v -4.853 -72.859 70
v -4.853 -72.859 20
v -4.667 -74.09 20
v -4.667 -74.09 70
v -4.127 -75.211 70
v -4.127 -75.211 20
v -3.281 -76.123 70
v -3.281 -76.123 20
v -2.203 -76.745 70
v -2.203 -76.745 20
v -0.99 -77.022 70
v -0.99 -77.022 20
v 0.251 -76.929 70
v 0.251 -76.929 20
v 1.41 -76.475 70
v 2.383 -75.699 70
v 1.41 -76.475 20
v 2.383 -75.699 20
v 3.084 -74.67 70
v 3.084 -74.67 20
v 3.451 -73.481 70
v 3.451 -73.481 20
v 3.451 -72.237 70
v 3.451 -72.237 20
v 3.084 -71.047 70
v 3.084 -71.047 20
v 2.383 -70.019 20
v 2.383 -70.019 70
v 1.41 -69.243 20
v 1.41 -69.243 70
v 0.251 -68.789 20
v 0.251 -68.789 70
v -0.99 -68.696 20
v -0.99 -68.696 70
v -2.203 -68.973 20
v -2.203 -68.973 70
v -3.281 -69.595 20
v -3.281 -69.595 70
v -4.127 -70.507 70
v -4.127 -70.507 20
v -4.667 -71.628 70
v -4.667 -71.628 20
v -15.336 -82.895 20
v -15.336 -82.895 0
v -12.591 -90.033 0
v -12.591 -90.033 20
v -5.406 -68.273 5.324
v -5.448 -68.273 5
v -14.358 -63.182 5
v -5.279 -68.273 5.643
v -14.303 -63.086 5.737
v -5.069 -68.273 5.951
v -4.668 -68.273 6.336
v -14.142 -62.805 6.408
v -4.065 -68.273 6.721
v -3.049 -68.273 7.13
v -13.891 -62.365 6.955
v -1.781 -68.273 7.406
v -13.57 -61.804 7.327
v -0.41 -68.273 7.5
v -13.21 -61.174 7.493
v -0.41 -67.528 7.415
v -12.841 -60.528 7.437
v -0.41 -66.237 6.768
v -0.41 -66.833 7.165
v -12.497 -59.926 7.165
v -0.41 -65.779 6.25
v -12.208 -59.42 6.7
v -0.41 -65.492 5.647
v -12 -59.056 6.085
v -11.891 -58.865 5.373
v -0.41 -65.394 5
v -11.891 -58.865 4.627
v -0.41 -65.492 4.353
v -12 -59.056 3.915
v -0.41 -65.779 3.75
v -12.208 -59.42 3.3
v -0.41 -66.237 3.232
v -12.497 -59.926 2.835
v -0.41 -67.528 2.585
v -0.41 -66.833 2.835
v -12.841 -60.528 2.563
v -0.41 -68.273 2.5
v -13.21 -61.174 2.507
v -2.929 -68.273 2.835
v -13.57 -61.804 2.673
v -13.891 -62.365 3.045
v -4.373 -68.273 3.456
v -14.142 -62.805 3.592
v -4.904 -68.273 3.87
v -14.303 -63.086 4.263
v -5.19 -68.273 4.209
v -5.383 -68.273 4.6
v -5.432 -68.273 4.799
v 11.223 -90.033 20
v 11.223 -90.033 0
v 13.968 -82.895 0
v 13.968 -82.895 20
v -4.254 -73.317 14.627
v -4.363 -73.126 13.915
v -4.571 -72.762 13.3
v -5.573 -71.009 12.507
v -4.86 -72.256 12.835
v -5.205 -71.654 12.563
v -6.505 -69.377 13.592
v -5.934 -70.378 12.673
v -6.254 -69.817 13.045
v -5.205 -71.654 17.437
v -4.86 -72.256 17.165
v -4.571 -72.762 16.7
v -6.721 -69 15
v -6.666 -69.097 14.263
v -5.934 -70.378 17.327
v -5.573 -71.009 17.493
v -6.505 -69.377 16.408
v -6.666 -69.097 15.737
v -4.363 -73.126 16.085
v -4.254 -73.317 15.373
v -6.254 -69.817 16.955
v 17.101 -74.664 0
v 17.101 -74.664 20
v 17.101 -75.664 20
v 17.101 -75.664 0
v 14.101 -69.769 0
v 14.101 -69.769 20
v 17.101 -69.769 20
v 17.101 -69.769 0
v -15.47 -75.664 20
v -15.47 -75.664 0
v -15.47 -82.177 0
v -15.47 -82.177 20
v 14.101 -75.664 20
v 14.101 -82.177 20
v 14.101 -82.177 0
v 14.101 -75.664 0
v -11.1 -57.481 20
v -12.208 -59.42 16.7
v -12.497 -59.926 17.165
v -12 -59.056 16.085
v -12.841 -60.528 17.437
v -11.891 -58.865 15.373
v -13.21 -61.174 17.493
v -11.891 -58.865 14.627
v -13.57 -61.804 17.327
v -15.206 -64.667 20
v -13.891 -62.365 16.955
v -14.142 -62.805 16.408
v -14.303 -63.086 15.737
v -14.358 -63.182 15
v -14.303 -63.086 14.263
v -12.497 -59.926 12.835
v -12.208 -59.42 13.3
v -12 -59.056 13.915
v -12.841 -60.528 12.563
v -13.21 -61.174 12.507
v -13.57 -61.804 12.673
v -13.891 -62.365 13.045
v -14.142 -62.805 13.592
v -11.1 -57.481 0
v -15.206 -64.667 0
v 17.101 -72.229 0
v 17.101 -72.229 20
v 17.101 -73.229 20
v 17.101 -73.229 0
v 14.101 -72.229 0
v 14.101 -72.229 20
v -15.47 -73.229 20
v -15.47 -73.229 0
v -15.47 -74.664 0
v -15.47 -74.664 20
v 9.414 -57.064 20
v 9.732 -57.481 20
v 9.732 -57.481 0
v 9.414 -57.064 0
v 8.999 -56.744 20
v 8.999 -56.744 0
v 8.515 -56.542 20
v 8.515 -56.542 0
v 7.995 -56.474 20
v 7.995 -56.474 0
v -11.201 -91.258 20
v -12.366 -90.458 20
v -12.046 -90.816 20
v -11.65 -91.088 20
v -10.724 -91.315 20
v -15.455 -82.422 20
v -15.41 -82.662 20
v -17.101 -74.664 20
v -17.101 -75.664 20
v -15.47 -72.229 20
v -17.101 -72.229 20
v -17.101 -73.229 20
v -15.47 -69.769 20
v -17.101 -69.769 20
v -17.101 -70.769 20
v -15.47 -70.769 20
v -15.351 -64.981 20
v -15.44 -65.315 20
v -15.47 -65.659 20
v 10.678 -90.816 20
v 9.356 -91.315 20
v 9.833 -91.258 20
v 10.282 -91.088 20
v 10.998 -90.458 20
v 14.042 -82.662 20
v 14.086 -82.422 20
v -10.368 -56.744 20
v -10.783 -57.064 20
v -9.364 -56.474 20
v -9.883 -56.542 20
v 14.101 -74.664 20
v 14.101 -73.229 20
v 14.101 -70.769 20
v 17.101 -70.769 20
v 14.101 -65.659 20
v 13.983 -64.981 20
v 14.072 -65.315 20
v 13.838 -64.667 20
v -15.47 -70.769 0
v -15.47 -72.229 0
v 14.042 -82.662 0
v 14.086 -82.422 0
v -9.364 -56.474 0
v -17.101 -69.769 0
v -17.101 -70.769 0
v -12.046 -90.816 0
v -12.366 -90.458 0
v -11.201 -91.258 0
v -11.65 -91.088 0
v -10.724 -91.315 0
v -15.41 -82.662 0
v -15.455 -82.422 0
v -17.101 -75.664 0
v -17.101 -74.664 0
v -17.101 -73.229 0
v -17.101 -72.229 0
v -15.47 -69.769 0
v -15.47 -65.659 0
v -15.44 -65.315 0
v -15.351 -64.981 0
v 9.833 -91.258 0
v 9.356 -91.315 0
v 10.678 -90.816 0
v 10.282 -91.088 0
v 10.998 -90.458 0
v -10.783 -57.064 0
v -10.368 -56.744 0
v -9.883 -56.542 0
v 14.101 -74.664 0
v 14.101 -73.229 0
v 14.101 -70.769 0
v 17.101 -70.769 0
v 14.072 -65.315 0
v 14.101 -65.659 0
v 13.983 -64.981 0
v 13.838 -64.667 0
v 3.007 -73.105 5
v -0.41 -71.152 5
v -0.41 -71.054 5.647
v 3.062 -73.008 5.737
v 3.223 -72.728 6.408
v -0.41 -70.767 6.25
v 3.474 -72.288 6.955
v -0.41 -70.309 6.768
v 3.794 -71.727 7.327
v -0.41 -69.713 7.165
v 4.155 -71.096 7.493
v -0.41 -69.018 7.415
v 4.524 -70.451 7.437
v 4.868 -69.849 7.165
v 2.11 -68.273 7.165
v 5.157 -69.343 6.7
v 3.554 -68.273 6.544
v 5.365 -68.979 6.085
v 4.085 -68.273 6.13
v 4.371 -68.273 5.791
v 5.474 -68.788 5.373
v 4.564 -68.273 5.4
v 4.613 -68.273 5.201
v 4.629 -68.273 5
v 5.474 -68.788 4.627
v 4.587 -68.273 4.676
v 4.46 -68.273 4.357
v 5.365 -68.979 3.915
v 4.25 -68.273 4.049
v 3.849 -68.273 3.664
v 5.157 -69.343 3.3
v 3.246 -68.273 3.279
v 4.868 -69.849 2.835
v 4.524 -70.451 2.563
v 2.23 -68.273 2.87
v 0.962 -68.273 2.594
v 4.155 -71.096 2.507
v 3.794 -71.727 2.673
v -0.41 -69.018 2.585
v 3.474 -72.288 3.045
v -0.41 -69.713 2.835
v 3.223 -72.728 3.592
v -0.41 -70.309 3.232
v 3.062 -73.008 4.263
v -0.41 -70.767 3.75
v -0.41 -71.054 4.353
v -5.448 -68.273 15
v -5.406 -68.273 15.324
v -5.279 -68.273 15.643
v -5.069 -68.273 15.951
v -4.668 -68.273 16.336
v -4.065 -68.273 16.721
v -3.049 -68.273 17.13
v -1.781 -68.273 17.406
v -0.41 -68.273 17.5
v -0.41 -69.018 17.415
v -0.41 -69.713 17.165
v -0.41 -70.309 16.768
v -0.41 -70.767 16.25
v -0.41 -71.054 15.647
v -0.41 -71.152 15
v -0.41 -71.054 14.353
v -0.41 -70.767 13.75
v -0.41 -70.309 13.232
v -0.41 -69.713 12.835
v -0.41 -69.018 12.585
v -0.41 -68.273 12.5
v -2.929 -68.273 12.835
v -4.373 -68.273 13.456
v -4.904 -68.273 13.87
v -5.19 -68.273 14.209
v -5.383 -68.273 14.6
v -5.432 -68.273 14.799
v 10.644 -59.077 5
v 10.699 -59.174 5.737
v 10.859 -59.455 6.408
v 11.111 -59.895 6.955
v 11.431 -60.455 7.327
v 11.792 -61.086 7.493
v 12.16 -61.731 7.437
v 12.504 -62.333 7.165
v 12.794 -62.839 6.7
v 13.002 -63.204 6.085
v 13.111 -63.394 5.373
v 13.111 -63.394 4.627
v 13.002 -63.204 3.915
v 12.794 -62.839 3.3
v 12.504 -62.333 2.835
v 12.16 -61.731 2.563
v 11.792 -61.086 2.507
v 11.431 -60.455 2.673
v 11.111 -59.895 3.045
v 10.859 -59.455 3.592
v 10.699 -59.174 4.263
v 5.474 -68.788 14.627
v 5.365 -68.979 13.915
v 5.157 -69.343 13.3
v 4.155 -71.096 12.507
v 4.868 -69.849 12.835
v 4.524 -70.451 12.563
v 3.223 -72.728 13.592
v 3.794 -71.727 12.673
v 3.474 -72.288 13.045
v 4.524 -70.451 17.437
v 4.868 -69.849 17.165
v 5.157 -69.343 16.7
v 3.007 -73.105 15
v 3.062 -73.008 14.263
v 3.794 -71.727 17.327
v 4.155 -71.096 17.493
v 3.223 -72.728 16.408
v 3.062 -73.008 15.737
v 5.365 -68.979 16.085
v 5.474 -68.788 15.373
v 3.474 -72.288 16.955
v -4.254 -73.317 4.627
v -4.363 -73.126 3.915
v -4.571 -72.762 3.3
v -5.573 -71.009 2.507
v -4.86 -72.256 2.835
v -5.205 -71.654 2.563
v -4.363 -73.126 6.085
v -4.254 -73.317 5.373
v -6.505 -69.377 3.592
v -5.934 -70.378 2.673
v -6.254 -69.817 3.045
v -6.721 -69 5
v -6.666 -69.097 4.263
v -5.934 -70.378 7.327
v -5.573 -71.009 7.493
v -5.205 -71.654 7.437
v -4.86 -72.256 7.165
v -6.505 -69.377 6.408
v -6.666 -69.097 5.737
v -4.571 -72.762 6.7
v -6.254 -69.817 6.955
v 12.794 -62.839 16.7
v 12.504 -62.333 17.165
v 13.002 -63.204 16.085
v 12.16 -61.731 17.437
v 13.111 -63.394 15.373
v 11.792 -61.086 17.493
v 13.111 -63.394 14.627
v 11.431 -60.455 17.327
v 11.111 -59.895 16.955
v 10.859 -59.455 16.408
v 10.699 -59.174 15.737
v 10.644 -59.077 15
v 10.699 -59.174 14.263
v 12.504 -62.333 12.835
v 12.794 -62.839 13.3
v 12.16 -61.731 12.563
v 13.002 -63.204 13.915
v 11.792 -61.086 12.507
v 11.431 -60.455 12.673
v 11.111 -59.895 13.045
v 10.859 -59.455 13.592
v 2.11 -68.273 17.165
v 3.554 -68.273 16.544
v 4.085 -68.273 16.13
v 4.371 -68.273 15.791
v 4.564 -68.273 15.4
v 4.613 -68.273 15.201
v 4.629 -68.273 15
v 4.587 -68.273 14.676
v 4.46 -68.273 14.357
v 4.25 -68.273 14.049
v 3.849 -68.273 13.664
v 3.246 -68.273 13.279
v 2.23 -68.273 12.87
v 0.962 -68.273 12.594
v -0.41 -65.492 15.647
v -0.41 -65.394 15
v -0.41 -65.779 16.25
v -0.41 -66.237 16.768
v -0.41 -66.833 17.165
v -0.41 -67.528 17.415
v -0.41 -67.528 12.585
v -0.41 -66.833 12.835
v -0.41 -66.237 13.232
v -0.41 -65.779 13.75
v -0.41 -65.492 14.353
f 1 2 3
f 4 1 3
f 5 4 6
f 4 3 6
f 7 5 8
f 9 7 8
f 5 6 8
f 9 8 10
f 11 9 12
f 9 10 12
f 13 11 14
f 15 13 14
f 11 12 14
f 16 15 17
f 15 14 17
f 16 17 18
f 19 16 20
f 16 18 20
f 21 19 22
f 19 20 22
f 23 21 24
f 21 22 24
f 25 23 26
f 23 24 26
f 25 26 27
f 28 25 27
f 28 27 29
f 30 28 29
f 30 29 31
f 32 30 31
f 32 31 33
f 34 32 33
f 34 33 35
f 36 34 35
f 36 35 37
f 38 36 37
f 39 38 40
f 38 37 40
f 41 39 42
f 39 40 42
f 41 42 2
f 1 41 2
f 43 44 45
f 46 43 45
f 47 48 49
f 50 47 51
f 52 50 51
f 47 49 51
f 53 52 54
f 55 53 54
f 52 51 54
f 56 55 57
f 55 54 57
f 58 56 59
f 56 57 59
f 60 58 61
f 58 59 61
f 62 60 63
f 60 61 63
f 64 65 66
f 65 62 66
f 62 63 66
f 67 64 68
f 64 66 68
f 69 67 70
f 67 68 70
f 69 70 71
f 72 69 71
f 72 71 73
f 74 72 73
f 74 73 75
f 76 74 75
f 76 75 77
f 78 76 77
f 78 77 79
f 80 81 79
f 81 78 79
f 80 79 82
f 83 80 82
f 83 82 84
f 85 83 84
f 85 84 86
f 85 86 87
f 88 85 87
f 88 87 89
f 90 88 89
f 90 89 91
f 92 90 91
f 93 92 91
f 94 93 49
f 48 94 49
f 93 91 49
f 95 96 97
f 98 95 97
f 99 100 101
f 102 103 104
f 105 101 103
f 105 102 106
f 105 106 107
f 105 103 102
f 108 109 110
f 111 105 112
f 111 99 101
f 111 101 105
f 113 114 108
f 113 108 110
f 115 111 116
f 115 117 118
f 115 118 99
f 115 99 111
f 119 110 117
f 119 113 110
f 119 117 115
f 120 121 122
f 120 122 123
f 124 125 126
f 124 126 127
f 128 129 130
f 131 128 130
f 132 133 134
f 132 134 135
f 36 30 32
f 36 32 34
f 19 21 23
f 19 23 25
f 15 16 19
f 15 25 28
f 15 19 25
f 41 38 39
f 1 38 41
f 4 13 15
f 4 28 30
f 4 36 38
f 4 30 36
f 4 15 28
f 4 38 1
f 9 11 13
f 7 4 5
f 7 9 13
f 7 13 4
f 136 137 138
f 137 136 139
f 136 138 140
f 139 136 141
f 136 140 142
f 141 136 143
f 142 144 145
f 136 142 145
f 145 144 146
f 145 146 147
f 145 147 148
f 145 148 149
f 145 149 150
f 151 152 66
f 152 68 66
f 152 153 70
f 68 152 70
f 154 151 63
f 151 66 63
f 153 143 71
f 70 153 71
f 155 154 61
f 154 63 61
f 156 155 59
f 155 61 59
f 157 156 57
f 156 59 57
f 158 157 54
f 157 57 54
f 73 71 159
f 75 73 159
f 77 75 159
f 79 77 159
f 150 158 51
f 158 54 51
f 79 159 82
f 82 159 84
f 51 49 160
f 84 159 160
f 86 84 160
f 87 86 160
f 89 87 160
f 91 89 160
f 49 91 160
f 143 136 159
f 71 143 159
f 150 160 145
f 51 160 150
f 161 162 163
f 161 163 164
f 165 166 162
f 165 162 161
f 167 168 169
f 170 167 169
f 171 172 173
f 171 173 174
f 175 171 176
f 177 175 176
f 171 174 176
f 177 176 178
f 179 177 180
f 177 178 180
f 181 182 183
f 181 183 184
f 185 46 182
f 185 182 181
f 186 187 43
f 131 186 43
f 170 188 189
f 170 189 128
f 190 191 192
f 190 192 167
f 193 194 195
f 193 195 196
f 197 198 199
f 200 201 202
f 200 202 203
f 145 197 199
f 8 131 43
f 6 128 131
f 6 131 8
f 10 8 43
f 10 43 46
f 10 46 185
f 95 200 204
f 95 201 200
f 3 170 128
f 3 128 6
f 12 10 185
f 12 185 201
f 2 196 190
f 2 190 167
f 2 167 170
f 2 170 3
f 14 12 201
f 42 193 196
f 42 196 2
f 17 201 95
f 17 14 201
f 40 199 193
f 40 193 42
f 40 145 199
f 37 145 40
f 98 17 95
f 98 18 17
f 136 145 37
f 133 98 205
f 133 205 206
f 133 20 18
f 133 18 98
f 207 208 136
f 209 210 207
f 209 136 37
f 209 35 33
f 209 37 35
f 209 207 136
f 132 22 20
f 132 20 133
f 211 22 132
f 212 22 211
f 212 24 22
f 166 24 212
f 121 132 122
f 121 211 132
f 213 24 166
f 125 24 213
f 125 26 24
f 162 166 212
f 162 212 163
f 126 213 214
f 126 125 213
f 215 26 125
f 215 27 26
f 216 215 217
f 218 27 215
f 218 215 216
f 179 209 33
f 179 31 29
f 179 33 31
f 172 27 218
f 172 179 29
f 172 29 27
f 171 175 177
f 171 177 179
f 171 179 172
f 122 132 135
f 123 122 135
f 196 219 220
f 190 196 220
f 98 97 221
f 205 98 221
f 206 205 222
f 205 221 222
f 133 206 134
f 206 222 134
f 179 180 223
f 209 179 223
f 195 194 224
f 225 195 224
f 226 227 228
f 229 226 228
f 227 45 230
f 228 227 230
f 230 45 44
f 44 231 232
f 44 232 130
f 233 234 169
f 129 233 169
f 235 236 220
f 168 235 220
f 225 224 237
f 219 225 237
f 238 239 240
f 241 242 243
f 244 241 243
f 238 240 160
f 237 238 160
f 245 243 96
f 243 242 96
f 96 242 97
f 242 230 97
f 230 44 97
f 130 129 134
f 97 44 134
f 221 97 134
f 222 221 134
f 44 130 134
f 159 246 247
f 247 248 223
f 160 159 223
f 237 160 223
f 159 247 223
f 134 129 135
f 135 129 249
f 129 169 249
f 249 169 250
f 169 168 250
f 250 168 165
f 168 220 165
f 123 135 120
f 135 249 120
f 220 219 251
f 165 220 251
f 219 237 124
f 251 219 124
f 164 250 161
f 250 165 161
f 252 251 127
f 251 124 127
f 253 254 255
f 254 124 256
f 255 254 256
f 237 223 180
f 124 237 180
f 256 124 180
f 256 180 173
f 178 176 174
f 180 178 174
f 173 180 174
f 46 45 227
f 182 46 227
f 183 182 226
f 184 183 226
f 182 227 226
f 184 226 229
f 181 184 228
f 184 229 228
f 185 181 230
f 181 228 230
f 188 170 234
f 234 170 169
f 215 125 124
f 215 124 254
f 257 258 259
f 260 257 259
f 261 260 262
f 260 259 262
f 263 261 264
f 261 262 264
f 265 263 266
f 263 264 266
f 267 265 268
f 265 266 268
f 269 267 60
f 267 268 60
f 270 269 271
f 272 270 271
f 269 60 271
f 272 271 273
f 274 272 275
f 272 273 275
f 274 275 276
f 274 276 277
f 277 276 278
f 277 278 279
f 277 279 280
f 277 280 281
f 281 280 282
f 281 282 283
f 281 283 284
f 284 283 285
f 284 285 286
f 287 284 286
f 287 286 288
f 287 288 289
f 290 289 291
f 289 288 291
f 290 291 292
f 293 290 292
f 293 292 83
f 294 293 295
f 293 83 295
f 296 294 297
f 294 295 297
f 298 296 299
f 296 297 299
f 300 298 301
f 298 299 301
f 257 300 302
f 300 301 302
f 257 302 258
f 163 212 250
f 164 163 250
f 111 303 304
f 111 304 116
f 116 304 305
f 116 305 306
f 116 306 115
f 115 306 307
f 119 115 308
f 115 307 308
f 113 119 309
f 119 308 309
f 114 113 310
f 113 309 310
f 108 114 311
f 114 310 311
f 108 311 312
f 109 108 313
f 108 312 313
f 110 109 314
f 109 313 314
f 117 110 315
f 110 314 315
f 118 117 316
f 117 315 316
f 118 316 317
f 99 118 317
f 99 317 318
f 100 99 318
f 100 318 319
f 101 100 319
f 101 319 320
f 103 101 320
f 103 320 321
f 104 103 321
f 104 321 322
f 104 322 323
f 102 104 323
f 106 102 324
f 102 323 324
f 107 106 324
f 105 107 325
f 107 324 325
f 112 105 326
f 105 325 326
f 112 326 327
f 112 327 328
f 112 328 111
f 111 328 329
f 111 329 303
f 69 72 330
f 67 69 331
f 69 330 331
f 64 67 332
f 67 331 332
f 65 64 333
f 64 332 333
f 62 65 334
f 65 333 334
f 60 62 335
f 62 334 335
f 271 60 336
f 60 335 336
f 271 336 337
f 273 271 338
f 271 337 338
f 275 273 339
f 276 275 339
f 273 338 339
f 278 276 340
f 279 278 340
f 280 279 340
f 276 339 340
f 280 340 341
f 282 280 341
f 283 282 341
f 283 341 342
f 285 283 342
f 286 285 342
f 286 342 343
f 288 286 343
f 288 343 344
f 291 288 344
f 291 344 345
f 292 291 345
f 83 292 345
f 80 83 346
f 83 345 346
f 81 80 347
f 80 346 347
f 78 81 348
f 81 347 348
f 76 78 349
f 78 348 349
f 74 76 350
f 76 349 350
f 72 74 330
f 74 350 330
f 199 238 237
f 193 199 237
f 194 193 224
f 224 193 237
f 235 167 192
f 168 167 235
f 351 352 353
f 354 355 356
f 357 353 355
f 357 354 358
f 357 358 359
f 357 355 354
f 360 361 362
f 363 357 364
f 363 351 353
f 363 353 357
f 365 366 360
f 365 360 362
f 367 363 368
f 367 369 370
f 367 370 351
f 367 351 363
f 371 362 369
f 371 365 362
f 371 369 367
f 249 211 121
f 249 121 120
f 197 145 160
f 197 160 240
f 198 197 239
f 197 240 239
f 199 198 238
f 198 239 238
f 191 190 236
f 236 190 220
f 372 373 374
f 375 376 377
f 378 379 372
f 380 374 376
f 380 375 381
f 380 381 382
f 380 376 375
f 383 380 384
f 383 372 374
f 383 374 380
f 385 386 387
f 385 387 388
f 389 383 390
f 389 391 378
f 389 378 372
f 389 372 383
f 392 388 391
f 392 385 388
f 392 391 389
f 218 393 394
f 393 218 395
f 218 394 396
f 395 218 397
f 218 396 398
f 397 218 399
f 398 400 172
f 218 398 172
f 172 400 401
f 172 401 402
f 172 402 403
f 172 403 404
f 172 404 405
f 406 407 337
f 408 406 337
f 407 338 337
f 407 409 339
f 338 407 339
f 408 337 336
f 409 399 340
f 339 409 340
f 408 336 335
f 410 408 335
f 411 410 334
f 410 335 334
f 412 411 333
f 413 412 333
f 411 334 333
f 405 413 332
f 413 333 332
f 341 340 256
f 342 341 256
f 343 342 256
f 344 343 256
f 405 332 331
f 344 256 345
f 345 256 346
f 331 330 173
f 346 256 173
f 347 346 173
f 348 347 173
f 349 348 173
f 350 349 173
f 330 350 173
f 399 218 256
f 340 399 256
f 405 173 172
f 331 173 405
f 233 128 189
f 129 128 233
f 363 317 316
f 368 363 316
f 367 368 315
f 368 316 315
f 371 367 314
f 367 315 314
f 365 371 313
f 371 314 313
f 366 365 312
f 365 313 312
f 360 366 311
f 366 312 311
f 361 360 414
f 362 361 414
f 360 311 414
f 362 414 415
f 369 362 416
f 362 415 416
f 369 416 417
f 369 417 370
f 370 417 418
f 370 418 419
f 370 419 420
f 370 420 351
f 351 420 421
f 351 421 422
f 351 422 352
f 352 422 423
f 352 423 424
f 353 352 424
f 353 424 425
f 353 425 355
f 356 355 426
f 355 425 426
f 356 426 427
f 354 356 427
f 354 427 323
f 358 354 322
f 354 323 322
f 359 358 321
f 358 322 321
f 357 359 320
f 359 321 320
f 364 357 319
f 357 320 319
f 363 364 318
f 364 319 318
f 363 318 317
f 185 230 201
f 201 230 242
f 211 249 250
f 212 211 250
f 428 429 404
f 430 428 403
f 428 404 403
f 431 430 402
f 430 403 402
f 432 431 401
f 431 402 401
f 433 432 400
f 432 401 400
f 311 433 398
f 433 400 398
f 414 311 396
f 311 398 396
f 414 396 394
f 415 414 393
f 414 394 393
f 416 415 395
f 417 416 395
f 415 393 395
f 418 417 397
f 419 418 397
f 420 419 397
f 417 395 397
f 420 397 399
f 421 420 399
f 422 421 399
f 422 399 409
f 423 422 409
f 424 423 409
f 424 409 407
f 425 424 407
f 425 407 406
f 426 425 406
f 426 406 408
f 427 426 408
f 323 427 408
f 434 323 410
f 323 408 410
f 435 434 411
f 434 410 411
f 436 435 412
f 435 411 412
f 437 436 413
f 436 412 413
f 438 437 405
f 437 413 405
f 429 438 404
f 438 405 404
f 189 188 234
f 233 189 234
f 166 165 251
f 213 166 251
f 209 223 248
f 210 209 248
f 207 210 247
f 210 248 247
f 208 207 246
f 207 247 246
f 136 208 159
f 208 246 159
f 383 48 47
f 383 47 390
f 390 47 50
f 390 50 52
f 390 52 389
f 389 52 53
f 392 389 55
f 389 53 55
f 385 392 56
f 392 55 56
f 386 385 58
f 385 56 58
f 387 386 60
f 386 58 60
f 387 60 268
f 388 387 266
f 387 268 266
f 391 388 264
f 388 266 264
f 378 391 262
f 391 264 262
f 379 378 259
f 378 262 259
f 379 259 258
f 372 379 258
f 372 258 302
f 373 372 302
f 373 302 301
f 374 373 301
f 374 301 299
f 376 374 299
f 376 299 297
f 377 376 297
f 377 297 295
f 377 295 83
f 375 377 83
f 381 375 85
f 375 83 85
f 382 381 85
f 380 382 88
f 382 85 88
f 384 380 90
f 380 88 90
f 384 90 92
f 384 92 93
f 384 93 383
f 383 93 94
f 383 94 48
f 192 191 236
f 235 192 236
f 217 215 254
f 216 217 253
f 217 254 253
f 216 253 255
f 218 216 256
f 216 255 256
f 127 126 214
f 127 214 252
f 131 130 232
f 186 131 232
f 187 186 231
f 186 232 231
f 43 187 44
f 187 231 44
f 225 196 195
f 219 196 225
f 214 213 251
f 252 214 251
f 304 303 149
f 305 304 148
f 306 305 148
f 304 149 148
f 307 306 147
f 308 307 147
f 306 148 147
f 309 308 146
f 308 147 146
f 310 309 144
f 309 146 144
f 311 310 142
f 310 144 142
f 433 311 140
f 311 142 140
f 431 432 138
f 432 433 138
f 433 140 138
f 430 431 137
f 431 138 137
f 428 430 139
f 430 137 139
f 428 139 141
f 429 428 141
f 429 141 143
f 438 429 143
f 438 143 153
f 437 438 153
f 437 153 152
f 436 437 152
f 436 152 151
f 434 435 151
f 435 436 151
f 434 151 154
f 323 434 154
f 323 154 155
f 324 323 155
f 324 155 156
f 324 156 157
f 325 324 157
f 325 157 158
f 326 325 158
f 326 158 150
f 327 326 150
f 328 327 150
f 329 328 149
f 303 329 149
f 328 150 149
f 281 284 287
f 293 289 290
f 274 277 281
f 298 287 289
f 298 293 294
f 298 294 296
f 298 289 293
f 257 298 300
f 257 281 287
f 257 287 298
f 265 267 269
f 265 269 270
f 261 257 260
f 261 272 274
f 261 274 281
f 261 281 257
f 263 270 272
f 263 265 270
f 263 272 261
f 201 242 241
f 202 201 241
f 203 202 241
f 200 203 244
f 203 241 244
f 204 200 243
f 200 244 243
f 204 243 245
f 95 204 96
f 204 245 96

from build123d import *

# Parameters (mm, degrees)
BOSS_EXTRUDE1_DEPTH = 20
SKETCH2_R           = 4.175
BOSS_EXTRUDE2_DEPTH = 50
SKETCH3_R           = 2.5
CUT_EXTRUDE1_DEPTH  = 20
SKETCH4_R           = 2.5
CUT_EXTRUDE2_DEPTH  = 20
SKETCH5_W           = 20
SKETCH5_H           = 1
BOSS_EXTRUDE3_DEPTH = 3


with BuildPart() as part:
    # Sketch1 → Boss-Extrude1 (new body)
    with BuildSketch(Plane.XY):
        with BuildLine():
            Line((7.995487969, -56.473761751), (-9.363697209, -56.473761751))
            ThreePointArc((-9.363697209, -56.473761751), (-10.367550845, -56.743941564), (-11.100183493, -57.481483874))
            Line((-11.100183493, -57.481483874), (-15.206075193, -64.666794349))
            ThreePointArc((-15.206075193, -64.666794349), (-15.402588207, -65.145736355), (-15.469588909, -65.659072225))
            Line((-15.469588909, -65.659072225), (-15.469588909, -82.177343211))
            ThreePointArc((-15.469588909, -82.177343211), (-15.435979311, -82.54245797), (-15.336280121, -82.895301369))
            Line((-15.336280121, -82.895301369), (-12.59092286, -90.03323025))
            ThreePointArc((-12.59092286, -90.03323025), (-11.856504513, -90.963895201), (-10.724231647, -91.315272091))
            Line((-10.724231647, -91.315272091), (9.356022407, -91.315272091))
            ThreePointArc((9.356022407, -91.315272091), (10.488295272, -90.963895201), (11.22271362, -90.03323025))
            Line((11.22271362, -90.03323025), (13.968070881, -82.895301369))
            ThreePointArc((13.968070881, -82.895301369), (14.067770071, -82.54245797), (14.101379669, -82.177343211))
            Line((14.101379669, -82.177343211), (14.101379669, -65.659072225))
            ThreePointArc((14.101379669, -65.659072225), (14.034378966, -65.145736355), (13.837865953, -64.666794349))
            Line((13.837865953, -64.666794349), (9.731974253, -57.481483874))
            ThreePointArc((9.731974253, -57.481483874), (8.999341605, -56.743941564), (7.995487969, -56.473761751))
        make_face()
    extrude(amount=BOSS_EXTRUDE1_DEPTH)

    # Sketch2 → Boss-Extrude2 (add)
    with BuildSketch(Plane.XY.offset(20)):
        with Locations(Location((-0.677787665, -72.858920612, 0), (0, 0, 180))):
            Circle(SKETCH2_R)
    extrude(amount=BOSS_EXTRUDE2_DEPTH)

    # Sketch3 → Cut-Extrude1 (cut)
    with BuildSketch(Plane(origin=(-17.424843232, -9.957053275, 0), x_dir=(0, 0, -1), z_dir=(0.868243142124459, 0.4961389383568344, 0))):
        with Locations(Location((-15, -59.074401838, 0), (0, 0, 90))):
            Circle(SKETCH3_R)
        with Locations(Location((-5, -59.074401838, 0), (0, 0, 90))):
            Circle(SKETCH3_R)
    extrude(amount=-CUT_EXTRUDE1_DEPTH, mode=Mode.SUBTRACT)

    # Sketch4 → Cut-Extrude2 (cut)
    with BuildSketch(Plane(origin=(16.393423958, -9.367670833, 0), x_dir=(0, 0, 1), z_dir=(-0.8682431421244587, 0.4961389383568347, 0))):
        with Locations(Location((5, -59.480800533, 0), (0, 0, 270))):
            Circle(SKETCH4_R)
        with Locations(Location((15, -59.480800533, 0), (0, 0, 270))):
            Circle(SKETCH4_R)
    extrude(amount=-CUT_EXTRUDE2_DEPTH, mode=Mode.SUBTRACT)

    # Sketch5 → Boss-Extrude3 (add)
    with BuildSketch(Plane(origin=(14.101379669, 0, 0), x_dir=(0, 0, -1), z_dir=(1, 0, 0))):
        with Locations((-10, -70.26948122)):
            Rectangle(SKETCH5_W, SKETCH5_H)
        with Locations((-10, -72.728796036)):
            Rectangle(SKETCH5_W, SKETCH5_H)
        with Locations((-10, -75.163517703)):
            Rectangle(SKETCH5_W, SKETCH5_H)
    boss_extrude3 = extrude(amount=BOSS_EXTRUDE3_DEPTH)

    # Mirror1: Boss-Extrude3 across plane
    add(boss_extrude3.mirror(Plane(origin=(0, 0, 0), x_dir=(0, 0, 1), z_dir=(1, 0, 0))))


solid = part.part
